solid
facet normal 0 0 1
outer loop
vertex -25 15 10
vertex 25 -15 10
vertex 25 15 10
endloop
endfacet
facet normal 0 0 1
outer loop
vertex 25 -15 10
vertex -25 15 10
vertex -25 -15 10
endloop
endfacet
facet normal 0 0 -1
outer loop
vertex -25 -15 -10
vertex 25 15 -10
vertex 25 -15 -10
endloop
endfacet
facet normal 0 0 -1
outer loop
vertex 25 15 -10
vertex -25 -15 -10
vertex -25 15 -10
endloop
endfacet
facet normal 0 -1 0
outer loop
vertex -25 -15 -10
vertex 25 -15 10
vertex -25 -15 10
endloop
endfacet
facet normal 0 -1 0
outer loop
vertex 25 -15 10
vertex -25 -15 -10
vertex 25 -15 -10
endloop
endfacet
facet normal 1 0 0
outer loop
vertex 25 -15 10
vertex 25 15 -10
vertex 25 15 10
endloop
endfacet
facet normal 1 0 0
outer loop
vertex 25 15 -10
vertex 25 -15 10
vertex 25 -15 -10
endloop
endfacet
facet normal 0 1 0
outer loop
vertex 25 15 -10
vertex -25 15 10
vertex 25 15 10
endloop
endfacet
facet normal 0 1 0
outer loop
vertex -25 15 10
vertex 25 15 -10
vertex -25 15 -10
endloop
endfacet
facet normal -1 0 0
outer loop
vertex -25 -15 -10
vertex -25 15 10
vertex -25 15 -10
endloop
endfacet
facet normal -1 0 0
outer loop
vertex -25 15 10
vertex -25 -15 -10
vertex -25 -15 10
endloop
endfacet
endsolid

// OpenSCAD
// Parameters
body_length = 50; //[25:100:1]
body_width  = 30; //[15:60:1]
body_height = 20; //[10:40:1]

$fn = 64;

// Main Body Module
module main_body() {
  color([0.85, 0.85, 0.8])
    cube([body_length, body_width, body_height], center=true);
}

// Final Component (single connected solid)
union() {
  main_body();
}
